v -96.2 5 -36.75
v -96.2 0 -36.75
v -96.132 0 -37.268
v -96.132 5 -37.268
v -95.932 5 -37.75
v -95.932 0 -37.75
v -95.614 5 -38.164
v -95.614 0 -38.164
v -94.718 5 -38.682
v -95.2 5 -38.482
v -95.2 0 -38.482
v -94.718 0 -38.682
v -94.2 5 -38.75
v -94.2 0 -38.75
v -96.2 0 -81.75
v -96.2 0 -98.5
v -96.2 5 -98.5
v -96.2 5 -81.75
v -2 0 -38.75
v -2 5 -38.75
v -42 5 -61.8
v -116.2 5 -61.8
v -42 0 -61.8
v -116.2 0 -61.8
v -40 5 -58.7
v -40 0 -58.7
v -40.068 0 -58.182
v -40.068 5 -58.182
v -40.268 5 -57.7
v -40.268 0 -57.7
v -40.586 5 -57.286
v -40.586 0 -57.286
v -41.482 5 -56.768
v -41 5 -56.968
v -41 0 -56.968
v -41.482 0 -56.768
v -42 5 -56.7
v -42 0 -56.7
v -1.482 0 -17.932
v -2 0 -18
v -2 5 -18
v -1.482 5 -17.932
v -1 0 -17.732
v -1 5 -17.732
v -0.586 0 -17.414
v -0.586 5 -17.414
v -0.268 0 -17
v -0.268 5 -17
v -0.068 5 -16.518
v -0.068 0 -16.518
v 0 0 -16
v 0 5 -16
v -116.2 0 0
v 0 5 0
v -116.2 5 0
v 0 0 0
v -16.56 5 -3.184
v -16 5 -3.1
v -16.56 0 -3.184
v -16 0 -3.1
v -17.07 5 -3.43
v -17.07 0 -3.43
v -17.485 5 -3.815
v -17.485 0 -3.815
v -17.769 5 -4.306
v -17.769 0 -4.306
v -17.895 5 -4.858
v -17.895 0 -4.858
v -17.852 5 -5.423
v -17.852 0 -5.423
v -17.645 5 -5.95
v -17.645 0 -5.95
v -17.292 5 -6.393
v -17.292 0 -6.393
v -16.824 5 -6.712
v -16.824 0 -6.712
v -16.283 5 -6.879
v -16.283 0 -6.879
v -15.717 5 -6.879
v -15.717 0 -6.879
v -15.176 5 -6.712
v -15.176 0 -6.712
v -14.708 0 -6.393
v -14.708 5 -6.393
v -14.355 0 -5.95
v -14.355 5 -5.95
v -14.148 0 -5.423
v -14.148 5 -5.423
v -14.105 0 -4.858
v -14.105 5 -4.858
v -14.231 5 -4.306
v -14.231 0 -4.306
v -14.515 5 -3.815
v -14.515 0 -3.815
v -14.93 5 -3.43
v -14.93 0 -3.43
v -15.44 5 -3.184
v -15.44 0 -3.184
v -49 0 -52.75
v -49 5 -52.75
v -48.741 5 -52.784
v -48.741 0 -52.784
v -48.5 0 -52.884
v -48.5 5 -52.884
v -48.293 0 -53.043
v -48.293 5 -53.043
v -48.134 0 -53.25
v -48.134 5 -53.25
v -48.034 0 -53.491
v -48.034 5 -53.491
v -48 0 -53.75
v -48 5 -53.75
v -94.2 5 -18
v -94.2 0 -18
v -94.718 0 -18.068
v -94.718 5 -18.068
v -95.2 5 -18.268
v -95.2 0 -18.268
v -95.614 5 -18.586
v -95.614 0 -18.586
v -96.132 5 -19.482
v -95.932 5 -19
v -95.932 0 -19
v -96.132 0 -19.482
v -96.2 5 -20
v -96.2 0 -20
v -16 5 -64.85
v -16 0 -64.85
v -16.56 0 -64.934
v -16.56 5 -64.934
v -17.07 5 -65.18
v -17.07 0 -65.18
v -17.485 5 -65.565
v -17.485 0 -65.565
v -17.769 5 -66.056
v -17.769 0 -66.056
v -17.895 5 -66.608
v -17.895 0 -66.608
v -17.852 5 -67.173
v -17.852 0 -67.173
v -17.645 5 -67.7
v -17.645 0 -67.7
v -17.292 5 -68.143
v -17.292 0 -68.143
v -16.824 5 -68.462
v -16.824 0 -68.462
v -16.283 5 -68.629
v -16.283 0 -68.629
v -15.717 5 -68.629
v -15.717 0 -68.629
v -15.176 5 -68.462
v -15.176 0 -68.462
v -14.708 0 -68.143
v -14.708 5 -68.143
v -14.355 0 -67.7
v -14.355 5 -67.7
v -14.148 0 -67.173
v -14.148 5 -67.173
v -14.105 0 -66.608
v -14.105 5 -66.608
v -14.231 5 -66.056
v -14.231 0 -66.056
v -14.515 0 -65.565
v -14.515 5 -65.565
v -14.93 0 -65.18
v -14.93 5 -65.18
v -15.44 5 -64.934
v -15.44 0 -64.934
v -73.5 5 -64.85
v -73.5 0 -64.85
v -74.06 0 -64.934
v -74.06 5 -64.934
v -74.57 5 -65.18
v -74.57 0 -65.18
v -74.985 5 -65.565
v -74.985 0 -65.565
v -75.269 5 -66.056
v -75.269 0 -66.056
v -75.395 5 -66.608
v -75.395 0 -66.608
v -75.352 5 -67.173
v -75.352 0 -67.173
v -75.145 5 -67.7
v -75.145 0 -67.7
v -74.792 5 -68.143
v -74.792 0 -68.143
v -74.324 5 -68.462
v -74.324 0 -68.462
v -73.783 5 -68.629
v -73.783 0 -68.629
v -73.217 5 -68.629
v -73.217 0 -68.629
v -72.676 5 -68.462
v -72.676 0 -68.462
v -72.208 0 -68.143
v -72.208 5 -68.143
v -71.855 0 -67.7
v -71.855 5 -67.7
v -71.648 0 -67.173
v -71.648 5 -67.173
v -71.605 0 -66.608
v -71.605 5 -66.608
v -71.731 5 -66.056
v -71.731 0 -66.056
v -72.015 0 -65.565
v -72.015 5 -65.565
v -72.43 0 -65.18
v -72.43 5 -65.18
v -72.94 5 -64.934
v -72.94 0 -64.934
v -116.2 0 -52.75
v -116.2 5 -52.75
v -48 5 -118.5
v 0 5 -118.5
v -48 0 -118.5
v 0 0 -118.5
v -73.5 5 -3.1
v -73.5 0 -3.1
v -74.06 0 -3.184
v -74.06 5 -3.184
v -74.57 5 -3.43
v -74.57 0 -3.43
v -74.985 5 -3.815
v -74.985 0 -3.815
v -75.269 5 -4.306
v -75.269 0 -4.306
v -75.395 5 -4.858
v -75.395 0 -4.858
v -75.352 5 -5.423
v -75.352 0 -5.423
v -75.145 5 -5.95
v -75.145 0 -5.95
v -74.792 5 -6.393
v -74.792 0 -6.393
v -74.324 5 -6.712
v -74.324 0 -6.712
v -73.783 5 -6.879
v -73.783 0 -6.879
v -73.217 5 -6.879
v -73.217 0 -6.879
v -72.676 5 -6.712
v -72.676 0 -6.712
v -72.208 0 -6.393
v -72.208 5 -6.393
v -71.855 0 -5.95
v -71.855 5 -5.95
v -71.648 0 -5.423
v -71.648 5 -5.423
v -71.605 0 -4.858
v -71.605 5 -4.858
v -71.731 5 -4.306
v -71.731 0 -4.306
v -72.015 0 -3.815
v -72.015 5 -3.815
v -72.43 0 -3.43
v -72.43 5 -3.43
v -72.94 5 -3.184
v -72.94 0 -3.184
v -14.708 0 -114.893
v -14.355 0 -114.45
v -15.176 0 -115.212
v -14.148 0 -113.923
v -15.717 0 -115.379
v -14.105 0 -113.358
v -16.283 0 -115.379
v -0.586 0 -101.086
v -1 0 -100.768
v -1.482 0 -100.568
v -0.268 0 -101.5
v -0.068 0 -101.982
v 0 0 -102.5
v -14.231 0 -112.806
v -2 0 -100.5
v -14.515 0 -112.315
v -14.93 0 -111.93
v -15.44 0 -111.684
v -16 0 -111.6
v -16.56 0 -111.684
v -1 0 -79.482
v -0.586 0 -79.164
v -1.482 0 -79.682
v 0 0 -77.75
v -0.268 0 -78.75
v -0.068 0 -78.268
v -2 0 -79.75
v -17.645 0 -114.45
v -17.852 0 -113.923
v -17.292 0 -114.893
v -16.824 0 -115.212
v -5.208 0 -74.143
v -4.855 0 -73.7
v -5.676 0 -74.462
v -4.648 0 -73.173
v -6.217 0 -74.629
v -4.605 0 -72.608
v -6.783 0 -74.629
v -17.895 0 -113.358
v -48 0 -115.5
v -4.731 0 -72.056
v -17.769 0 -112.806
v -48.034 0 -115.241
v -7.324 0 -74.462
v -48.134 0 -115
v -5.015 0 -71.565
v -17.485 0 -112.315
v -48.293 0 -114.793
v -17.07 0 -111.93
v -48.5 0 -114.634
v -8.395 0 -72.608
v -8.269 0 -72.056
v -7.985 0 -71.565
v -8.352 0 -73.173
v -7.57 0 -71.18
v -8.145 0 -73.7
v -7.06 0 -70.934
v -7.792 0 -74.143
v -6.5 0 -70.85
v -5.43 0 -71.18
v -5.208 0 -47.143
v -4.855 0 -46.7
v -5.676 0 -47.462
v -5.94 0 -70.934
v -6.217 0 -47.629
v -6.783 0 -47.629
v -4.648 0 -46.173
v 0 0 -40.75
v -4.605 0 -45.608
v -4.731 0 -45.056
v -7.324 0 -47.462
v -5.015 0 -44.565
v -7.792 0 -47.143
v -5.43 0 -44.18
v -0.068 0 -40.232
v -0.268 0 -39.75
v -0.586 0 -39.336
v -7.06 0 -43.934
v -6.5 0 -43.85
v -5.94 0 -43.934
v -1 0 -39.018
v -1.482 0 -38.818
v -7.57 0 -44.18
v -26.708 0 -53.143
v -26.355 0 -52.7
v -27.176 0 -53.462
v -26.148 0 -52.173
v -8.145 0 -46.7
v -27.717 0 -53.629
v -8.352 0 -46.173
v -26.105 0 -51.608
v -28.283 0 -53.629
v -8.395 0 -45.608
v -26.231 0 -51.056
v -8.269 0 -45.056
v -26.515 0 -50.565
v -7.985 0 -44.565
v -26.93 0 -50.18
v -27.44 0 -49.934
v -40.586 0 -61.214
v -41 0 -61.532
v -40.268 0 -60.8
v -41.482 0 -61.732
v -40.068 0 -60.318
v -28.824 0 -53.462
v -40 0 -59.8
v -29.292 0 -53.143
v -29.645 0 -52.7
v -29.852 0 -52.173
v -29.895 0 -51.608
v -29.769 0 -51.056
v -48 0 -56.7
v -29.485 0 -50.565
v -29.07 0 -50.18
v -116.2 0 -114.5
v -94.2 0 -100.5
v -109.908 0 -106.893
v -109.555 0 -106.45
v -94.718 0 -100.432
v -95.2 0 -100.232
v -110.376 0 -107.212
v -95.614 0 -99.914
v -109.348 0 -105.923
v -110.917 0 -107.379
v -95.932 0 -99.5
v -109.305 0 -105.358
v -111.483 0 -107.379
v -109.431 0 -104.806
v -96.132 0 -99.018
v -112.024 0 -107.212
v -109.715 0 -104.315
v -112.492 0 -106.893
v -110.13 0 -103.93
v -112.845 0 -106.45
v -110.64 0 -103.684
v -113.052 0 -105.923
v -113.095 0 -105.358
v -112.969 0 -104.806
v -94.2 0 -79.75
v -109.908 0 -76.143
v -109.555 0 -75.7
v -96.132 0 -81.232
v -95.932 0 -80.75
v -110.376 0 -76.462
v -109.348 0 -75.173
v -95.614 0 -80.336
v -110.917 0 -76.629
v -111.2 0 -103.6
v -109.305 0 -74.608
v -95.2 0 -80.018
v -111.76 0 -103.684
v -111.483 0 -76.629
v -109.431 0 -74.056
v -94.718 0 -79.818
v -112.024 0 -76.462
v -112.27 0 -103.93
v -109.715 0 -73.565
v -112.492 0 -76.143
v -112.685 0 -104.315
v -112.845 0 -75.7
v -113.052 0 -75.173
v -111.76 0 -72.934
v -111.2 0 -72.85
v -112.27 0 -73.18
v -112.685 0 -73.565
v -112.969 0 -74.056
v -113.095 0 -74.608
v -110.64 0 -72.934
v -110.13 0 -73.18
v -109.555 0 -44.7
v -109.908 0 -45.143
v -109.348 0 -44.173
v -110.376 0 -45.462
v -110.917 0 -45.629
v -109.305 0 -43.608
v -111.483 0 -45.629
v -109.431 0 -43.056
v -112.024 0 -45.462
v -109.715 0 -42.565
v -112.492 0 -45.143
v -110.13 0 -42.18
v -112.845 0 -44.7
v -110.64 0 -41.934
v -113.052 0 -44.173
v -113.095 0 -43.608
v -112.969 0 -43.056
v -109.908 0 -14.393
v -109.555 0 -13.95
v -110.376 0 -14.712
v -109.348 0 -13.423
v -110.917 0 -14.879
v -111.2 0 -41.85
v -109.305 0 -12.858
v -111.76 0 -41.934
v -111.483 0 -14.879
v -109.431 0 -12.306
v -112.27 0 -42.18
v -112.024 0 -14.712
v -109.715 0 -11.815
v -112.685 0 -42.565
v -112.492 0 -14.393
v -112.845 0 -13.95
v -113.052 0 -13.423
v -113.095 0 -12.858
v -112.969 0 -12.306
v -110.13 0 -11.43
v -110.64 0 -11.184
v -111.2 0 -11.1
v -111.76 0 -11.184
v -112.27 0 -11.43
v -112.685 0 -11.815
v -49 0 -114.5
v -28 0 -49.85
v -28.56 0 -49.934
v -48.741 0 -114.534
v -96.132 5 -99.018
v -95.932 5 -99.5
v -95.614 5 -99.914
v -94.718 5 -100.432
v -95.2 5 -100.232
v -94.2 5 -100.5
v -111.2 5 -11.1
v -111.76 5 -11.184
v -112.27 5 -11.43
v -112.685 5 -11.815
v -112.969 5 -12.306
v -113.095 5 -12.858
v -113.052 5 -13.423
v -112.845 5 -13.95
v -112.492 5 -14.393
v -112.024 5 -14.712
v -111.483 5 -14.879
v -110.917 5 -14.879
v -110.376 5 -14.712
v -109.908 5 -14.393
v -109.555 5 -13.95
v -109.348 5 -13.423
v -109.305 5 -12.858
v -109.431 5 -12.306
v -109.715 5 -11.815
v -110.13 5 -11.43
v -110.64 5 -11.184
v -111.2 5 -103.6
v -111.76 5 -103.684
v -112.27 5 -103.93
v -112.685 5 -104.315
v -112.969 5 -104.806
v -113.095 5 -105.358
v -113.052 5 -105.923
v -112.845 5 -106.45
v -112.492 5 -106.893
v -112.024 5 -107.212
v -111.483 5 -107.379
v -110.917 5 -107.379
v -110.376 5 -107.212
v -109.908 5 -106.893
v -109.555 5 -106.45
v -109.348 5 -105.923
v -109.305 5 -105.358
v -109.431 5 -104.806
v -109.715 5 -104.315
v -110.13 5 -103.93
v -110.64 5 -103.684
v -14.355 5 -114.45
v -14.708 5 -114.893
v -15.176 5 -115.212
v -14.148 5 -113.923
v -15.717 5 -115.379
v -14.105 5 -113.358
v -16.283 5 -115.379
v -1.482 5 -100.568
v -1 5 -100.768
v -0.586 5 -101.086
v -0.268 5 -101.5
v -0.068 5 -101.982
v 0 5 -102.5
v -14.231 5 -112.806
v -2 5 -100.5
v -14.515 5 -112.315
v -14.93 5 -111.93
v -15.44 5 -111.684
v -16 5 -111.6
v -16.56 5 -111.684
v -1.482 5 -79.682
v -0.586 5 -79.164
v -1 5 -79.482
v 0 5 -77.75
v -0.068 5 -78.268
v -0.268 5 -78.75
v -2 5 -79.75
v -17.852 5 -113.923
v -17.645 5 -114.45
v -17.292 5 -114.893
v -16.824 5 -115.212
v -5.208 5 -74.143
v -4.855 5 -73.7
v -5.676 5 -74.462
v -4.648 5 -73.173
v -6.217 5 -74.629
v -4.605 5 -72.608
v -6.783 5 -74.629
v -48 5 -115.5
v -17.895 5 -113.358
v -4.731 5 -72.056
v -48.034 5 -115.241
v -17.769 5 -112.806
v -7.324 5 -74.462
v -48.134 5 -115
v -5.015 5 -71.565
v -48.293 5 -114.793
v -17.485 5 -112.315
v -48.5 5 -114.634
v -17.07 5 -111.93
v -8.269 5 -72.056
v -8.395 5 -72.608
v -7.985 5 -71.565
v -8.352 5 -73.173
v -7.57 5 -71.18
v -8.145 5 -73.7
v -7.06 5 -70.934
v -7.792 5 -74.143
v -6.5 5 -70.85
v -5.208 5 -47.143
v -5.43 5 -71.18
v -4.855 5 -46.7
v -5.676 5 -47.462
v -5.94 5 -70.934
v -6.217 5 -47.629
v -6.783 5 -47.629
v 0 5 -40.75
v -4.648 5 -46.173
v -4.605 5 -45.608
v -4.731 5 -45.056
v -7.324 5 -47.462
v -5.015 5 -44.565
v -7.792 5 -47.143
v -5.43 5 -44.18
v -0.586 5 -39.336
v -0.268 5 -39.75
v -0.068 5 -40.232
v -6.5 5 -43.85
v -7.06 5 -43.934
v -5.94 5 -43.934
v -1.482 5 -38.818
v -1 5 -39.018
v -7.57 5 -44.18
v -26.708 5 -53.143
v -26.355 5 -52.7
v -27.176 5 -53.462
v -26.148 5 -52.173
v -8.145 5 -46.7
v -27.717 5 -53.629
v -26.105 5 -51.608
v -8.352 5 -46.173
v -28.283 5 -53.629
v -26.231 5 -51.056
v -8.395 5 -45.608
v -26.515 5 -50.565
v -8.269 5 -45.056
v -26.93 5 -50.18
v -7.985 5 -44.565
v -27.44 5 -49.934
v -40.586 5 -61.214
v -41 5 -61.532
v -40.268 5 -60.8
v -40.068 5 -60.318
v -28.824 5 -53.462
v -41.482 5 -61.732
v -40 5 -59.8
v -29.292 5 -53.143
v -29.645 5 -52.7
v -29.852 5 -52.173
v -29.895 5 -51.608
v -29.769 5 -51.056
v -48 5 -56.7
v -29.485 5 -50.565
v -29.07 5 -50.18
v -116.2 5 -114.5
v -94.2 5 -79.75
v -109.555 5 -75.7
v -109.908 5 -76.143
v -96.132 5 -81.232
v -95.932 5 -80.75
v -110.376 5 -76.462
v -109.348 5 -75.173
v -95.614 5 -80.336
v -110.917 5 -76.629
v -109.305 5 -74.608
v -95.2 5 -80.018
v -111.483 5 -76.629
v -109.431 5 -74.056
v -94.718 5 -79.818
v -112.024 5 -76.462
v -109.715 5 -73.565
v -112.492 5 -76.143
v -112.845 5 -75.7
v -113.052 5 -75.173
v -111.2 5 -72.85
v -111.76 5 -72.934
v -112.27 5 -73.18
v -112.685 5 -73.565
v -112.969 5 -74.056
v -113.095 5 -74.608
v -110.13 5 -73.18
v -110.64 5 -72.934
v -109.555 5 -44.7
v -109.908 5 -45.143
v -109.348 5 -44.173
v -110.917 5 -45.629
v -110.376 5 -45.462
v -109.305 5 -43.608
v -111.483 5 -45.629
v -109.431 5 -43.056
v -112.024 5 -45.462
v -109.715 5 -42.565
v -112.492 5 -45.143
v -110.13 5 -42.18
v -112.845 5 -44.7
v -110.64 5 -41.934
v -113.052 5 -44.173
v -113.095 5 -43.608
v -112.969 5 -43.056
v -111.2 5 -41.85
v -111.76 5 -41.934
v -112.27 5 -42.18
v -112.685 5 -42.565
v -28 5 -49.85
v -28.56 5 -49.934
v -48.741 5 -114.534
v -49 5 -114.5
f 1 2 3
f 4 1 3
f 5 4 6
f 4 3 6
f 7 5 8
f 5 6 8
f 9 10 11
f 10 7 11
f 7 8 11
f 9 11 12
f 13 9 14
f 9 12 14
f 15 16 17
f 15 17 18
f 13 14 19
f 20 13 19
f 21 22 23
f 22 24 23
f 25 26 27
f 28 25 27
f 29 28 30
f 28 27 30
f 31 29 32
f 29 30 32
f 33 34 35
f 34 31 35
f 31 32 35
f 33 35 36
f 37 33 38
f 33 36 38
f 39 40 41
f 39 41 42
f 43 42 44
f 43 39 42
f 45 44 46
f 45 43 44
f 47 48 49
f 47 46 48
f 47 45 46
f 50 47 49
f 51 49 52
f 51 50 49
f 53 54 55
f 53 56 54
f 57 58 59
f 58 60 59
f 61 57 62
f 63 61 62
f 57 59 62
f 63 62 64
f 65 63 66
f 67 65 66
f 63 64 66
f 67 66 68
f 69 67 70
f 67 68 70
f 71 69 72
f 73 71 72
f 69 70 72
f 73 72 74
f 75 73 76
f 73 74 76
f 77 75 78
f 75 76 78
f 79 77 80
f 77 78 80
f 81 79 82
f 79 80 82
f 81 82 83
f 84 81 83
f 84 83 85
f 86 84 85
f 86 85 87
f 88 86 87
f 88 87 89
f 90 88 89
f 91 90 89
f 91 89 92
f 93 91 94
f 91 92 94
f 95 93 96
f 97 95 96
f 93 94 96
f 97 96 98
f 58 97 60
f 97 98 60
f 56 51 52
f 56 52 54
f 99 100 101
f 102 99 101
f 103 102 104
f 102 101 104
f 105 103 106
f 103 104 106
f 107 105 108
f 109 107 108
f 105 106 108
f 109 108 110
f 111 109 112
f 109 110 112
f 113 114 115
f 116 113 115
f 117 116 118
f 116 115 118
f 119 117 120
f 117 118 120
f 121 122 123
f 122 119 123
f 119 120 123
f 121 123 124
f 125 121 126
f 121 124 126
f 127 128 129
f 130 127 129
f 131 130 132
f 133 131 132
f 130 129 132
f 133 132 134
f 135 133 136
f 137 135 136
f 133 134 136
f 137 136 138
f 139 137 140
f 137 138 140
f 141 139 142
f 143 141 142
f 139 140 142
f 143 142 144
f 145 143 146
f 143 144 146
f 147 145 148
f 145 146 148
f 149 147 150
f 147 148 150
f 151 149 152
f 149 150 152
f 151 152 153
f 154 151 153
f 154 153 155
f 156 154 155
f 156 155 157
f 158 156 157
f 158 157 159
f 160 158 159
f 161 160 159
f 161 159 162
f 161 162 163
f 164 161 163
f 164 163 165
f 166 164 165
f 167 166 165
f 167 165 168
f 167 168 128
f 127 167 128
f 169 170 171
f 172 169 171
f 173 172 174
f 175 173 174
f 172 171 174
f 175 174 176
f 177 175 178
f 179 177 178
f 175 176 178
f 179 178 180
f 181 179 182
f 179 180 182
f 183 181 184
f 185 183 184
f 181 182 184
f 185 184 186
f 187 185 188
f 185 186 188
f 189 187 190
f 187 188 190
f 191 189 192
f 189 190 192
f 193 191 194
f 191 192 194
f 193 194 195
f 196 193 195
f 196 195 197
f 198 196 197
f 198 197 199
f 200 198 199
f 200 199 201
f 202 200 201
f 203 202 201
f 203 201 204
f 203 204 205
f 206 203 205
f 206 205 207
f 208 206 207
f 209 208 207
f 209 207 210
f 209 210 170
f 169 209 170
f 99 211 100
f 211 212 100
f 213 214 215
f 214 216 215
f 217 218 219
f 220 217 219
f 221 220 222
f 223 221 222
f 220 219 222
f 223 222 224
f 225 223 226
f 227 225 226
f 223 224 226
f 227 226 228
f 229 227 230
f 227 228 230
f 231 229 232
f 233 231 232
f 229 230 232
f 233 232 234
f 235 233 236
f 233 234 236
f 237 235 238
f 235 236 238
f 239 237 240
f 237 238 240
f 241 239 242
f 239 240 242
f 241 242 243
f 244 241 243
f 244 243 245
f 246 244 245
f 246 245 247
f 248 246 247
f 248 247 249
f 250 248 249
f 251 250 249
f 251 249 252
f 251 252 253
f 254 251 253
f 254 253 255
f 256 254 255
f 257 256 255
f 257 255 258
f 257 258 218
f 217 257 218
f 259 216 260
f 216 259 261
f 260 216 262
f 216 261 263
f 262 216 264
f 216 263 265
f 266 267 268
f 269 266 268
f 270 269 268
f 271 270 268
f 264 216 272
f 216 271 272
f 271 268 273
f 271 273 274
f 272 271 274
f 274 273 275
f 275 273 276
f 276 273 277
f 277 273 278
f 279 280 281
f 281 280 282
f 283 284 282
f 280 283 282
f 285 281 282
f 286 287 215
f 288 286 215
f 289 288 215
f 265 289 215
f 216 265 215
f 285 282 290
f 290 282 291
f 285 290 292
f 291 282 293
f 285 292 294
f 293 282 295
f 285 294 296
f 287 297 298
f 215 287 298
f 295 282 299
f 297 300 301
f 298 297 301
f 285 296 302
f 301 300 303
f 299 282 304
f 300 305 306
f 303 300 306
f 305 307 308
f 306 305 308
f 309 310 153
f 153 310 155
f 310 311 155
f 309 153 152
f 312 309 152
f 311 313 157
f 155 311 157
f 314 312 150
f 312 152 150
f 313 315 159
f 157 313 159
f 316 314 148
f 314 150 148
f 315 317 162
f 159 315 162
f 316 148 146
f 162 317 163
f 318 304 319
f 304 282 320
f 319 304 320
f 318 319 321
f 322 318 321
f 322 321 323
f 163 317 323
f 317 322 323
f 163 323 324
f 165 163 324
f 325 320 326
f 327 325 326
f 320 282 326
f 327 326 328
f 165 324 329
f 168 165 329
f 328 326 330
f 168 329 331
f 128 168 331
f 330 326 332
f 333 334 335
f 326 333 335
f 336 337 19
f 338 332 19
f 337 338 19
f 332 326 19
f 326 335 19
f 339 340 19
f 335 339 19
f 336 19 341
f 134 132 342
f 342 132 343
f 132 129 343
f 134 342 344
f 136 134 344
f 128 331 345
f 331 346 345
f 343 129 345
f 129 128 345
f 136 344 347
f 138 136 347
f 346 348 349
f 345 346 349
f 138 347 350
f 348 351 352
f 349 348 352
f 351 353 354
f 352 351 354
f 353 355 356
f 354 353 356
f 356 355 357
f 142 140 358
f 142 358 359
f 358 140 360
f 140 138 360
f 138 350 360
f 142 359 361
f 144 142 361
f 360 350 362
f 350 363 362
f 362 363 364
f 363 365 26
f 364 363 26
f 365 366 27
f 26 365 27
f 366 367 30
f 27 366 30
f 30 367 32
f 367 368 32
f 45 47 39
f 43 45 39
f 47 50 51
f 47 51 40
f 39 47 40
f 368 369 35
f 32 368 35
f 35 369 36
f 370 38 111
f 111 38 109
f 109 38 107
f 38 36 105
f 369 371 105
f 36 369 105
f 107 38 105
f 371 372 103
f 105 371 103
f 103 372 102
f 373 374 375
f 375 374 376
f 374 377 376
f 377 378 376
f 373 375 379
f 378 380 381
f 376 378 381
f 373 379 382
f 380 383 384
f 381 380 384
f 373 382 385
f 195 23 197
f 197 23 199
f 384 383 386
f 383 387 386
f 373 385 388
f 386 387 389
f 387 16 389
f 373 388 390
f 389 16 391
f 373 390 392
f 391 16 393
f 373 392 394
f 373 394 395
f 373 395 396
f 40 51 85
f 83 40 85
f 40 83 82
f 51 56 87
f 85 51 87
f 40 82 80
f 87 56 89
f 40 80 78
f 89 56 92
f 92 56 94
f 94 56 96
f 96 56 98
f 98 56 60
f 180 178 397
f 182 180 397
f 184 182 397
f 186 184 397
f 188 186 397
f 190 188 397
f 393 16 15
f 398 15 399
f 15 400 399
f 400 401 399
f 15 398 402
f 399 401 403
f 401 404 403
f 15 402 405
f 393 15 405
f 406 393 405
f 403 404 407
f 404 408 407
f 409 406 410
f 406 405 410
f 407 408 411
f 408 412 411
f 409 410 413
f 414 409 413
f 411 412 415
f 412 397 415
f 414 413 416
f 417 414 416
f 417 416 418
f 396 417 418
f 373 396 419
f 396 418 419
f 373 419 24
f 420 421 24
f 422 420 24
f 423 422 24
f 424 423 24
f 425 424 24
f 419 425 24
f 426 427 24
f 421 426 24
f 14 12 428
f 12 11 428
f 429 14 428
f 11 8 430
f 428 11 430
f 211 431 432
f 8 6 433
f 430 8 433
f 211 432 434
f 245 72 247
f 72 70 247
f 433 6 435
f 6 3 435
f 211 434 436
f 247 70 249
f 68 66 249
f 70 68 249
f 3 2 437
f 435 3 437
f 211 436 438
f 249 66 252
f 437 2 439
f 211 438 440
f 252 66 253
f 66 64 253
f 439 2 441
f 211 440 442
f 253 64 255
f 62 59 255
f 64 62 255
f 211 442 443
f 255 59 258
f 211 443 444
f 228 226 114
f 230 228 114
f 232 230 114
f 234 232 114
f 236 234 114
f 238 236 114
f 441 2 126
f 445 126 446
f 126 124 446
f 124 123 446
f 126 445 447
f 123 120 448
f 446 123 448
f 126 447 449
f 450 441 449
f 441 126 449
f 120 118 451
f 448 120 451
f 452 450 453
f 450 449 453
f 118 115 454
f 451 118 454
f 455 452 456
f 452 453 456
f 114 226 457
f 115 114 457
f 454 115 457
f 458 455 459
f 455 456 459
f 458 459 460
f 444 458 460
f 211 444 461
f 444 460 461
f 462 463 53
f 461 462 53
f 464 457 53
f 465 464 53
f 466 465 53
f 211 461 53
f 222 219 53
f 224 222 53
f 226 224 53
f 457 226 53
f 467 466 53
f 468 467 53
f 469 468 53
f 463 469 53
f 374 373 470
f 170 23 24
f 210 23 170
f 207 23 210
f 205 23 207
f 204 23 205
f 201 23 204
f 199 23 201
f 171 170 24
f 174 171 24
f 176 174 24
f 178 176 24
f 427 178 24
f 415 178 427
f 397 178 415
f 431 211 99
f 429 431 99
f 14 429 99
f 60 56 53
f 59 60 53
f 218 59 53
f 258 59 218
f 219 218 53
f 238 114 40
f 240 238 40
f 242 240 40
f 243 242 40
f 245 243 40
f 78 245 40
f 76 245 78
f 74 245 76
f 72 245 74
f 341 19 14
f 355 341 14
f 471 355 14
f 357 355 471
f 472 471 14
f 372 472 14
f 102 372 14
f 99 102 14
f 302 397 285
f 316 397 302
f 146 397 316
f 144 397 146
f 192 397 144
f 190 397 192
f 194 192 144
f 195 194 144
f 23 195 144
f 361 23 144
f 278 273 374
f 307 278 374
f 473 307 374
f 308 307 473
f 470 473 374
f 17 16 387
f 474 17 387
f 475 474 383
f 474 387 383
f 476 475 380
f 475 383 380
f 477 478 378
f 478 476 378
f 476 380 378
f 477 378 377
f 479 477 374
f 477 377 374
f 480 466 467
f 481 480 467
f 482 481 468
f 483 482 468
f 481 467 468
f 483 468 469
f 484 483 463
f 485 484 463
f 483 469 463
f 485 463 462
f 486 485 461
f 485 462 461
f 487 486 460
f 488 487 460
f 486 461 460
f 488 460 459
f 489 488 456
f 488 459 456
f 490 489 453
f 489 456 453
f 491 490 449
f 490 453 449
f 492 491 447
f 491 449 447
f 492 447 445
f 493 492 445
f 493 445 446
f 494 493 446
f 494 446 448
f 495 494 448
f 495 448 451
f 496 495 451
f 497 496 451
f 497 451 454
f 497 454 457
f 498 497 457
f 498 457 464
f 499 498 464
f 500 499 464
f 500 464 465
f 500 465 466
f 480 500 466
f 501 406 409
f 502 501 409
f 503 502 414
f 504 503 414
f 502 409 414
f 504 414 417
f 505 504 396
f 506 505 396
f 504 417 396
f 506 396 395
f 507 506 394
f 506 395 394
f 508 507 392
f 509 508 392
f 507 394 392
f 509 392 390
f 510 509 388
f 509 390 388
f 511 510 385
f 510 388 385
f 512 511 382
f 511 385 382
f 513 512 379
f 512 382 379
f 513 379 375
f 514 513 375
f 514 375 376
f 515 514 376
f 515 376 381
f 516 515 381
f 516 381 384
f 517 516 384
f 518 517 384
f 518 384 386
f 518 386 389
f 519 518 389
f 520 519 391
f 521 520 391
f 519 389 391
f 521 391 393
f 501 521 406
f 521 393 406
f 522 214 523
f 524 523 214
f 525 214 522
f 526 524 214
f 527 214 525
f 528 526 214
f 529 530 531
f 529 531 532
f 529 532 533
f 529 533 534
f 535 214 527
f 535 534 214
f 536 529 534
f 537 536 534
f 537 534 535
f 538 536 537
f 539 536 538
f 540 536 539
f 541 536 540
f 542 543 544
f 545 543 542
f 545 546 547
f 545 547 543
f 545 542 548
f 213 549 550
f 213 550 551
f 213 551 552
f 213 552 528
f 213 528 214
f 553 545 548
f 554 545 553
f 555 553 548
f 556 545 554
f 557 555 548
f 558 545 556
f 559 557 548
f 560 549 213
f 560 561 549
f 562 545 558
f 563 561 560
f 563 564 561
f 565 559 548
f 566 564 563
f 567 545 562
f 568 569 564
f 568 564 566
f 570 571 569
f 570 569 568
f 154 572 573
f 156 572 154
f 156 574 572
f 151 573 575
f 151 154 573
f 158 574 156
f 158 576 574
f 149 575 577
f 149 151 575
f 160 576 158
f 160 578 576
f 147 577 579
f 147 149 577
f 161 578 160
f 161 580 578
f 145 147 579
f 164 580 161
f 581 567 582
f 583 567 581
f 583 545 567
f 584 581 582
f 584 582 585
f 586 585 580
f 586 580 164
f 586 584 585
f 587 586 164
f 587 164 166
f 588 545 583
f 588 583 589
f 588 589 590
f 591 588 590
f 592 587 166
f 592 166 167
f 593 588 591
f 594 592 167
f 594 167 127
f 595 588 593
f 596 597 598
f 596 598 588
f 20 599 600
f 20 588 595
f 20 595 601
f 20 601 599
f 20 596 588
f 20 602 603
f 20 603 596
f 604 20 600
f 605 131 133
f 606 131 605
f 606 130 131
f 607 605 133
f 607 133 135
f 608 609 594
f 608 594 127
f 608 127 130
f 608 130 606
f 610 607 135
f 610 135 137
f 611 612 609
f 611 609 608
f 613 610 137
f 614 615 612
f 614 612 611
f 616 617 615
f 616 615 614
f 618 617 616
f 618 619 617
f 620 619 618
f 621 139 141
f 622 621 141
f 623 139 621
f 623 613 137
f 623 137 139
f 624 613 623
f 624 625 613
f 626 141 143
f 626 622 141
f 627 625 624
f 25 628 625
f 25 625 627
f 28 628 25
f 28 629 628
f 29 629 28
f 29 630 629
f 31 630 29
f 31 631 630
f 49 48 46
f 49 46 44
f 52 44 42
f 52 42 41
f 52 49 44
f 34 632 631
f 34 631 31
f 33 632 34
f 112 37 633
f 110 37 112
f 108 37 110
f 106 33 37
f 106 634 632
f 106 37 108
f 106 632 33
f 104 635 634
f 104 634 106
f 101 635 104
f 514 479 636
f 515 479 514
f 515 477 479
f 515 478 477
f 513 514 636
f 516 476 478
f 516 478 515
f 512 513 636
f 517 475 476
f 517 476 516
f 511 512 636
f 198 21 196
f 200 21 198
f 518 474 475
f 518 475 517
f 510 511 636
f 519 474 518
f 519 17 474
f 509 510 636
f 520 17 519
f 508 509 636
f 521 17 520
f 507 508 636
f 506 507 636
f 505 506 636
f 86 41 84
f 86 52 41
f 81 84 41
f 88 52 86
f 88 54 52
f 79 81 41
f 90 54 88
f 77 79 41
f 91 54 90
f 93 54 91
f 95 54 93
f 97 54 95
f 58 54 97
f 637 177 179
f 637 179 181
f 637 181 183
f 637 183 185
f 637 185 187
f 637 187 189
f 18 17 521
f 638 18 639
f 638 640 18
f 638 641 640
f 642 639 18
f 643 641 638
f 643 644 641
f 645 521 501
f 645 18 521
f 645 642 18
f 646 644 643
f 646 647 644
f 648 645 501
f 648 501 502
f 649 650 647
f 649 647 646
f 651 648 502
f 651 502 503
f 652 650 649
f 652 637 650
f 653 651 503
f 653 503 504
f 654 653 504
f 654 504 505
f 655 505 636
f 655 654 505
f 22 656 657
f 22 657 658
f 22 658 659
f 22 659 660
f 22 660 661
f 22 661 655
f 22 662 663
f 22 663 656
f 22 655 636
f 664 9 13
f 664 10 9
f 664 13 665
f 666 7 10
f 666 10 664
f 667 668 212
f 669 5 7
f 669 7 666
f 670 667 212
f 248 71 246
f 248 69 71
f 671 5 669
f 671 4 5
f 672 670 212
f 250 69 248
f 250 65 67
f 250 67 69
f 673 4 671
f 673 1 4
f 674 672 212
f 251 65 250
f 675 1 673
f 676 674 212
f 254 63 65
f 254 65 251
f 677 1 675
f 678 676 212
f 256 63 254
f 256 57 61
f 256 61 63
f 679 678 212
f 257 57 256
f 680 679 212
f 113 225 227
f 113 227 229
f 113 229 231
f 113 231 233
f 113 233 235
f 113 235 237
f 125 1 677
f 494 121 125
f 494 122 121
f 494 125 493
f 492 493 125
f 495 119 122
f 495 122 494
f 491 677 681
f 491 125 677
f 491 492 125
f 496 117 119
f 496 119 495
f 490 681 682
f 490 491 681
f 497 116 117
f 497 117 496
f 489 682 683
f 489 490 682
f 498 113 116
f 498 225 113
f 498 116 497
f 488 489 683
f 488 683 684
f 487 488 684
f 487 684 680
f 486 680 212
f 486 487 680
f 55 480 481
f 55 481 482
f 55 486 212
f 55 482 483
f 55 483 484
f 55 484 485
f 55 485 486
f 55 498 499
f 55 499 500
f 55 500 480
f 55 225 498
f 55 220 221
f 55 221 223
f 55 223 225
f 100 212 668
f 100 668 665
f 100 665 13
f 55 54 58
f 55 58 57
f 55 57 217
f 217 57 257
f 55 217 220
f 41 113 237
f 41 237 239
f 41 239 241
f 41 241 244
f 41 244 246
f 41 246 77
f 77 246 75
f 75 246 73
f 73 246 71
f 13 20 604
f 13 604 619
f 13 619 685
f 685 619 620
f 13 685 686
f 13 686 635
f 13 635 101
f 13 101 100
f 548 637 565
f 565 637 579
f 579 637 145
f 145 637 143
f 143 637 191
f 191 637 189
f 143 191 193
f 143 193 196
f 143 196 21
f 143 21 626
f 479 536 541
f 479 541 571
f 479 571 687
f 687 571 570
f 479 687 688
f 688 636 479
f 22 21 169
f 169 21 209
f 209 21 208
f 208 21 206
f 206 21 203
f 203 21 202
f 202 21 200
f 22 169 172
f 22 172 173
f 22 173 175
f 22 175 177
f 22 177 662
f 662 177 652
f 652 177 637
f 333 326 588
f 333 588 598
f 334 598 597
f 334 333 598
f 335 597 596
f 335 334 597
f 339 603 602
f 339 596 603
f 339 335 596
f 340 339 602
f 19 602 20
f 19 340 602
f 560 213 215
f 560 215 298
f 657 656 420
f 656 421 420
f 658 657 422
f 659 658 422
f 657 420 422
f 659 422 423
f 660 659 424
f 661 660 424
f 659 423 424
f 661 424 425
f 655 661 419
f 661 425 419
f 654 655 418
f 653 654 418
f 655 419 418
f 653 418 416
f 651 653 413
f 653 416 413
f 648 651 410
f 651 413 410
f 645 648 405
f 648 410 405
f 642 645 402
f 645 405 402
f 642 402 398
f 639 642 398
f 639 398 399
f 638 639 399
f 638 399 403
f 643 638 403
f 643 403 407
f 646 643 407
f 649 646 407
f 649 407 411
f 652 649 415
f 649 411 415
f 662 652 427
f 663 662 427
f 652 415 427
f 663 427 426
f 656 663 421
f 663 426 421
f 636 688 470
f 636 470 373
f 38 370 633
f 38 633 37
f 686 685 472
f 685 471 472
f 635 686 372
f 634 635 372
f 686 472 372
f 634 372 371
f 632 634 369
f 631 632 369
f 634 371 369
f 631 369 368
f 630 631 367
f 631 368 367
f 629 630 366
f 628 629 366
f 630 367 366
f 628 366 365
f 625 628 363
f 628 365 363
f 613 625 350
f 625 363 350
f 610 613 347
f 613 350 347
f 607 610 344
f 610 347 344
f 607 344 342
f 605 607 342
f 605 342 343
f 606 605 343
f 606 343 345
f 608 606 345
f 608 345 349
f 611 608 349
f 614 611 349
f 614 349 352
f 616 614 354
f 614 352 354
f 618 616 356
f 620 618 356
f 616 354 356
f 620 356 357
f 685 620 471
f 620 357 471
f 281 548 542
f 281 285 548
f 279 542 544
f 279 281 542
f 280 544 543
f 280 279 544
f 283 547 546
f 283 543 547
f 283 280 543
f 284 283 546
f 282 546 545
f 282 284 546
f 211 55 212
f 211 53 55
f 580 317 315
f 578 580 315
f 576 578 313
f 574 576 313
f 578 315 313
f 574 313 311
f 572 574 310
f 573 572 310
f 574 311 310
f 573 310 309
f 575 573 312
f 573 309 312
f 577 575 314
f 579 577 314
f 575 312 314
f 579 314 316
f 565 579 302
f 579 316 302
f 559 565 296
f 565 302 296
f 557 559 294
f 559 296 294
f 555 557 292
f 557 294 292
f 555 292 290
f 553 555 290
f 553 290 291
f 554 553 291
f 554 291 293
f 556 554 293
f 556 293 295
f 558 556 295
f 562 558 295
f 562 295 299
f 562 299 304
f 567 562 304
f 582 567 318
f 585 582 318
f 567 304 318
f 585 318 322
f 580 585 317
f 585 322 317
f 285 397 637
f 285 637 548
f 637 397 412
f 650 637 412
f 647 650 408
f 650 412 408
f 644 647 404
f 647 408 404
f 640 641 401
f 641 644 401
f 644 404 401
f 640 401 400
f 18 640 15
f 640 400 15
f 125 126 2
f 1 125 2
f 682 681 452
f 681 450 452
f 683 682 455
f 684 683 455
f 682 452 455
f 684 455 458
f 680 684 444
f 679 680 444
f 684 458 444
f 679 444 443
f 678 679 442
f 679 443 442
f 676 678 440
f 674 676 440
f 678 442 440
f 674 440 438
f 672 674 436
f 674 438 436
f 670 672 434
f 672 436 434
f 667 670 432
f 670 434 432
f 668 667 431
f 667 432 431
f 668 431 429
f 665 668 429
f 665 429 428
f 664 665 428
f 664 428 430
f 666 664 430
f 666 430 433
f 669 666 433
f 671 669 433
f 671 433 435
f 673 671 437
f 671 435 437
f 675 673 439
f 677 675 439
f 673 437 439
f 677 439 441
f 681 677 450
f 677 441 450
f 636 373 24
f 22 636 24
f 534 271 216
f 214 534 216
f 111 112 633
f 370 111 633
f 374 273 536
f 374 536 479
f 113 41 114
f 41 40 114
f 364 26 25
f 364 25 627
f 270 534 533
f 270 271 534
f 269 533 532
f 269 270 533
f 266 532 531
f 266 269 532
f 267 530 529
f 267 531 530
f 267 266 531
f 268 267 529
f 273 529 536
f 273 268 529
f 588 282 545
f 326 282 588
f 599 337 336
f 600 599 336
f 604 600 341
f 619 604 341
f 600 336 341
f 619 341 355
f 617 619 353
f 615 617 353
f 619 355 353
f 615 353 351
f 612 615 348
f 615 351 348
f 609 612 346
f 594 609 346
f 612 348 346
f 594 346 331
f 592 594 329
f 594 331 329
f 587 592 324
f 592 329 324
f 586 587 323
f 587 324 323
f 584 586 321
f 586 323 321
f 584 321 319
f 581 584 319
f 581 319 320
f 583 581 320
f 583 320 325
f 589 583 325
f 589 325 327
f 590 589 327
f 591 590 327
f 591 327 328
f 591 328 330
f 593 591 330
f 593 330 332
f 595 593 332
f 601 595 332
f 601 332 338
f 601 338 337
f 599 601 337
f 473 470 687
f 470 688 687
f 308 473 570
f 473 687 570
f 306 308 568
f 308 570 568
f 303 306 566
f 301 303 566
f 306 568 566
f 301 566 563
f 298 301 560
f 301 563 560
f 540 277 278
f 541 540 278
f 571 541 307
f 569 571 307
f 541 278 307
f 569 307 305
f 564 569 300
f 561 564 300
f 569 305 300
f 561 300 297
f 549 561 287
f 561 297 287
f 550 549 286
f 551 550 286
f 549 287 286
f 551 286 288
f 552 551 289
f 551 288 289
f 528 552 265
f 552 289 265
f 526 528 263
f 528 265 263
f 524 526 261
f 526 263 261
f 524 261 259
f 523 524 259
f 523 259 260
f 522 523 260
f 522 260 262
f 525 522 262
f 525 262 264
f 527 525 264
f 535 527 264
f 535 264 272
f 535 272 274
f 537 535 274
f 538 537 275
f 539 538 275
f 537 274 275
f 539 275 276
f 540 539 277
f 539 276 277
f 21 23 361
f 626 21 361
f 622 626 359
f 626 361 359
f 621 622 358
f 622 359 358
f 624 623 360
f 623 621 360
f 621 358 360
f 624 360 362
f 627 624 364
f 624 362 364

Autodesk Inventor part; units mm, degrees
ref_plane "YZ Plane" through (0, 0, 0) normal (1, 0, 0) x (0, 1, 0)
ref_plane "XZ Plane" through (0, 0, 0) normal (0, 1, 0) x (-1, 0, 0)
ref_plane "XY Plane" through (0, 0, 0) normal (0, 0, 1) x (1, 0, 0)
sketch "Sketch1" plane through (0, 0, 0) normal (0, 1, 0) x (-1, 0, 0)
  line L0 (0, 0) -> (116.2, 0)
  line L1 (116.2, 0) -> (116.2, -56.7)
  line L2 (116.2, -56.7) -> (42, -56.7)
  line L3 (2, -18) -> (94.2, -18)
  line L4 (96.2, -20) -> (96.2, -36.75)
  line L5 (94.2, -38.75) -> (2, -38.75)
  arc A0 (96.2, -20) -> (94.2, -18) centre (94.2, -20) ccw
  arc A1 (94.2, -38.75) -> (96.2, -36.75) centre (94.2, -36.75) ccw
  line L6 (0, -56.75) -> (0, -40.75)
  line L7 (0, -16) -> (0, 0)
  arc A2 (0, -16) -> (2, -18) centre (2, -16) ccw
  arc A3 (2, -38.75) -> (0, -40.75) centre (2, -40.75) ccw
  line L8 (151.2965, -59.25) -> (-22.324, -59.25) construction
  line L9 (0, -118.5) -> (116.2, -118.5)
  line L10 (116.2, -118.5) -> (116.2, -61.8)
  line L11 (116.2, -61.8) -> (42, -61.8)
  line L12 (2, -100.5) -> (94.2, -100.5)
  line L13 (96.2, -98.5) -> (96.2, -81.75)
  line L14 (94.2, -79.75) -> (2, -79.75)
  arc A4 (94.2, -100.5) -> (96.2, -98.5) centre (94.2, -98.5) ccw
  arc A5 (96.2, -81.75) -> (94.2, -79.75) centre (94.2, -81.75) ccw
  line L15 (0, -61.75) -> (0, -77.75)
  line L16 (0, -102.5) -> (0, -118.5)
  arc A6 (2, -100.5) -> (0, -102.5) centre (2, -102.5) ccw
  arc A7 (0, -77.75) -> (2, -79.75) centre (2, -77.75) ccw
  line L17 (40, -58.7) -> (40, -59.8)
  line L18 (0, -61.75) -> (0, -56.75)
  arc A8 (40, -59.8) -> (42, -61.8) centre (42, -59.8) ccw
  arc A9 (42, -56.7) -> (40, -58.7) centre (42, -58.7) ccw
  point P0 (96.2, -38.75)
  point P1 (96.2, -18)
  point P2 (0, -38.75)
  point P3 (0, -28.375)
  point P4 (96.2, -79.75)
  point P5 (96.2, -100.5)
  point P6 (0, -79.75)
  point P7 (0, -90.125)
  dimension "d3" = 20.75
  dimension "d4" = 2
  dimension "d11" = 2
  dimension "d26" = 2
  dimension "d27" = 59.25
  dimension "d28" = 59.25
  dimension "d29" = 116.2
  dimension "d30" = 20
  dimension "d31" = 5.1
  dimension "d32" = 2.55
  dimension "d33" = 40
  dimension "d34" = 18
extrude "Extrusion1" add sketch "Sketch1" along normal blind 5
sketch "Sketch3" plane through (0, 5, 0) normal (0, 1, 0) x (1, 0, 0)
  line L0 (-141.9344, 59.25) -> (33.9299, 59.25) construction
  line L1 (0, 40.75) -> (0, 77.75) construction
  line L2 (-141.9344, 66.75) -> (21.3081, 66.75) construction
  line L3 (-111.2, -34.402) -> (-111.2, 125.7551) construction
  line L4 (-130.4345, 113.5) -> (5.6009, 113.5) construction
  line L5 (-141.9344, 5) -> (8.4057, 5) construction
  line L6 (-116.2, 0) -> (0, 0) construction
  line L7 (0, 118.5) -> (-116.2, 118.5) construction
  line L8 (-150.0685, 51.75) -> (12.052, 51.75) construction
  line L9 (-16, -62.5764) -> (-16, 180.6044) construction
  line L10 (0, 102.5) -> (0, 118.5) construction
  line L11 (-73.5, -39.5766) -> (-73.5, 137.6901) construction
  line L12 (-73.5, -38.2066) -> (-73.5, 155.6811) construction
  line L13 (-116.2, 56.7) -> (-116.2, 0) projected
  point P0 (0, 59.25)
  point P1 (-111.2, 13)
  point P2 (-111.2, 43.75)
  point P3 (-111.2, 74.75)
  point P4 (-111.2, 105.5)
  point P5 (-16, 5)
  point P6 (-16, 113.5)
  point P7 (-16, 66.75)
  point P8 (-73.5, 66.75)
  point P9 (-28, 51.75)
  point P10 (-73.5, 5)
  dimension "d35" = 5
  dimension "d36" = 5
  dimension "d37" = 7.5
  dimension "d38" = 13
  dimension "d39" = 15.5
  dimension "d40" = 15.5
  dimension "d41" = 13
  dimension "d42" = 7.5
  dimension "d43" = 16
  dimension "d44" = 12
  dimension "d45" = 73.5
  dimension "d53" = 73.5
  dimension "d54" = 5
hole "Hole1" at (-111.2, 5, -13) at (-111.2, 5, -43.75) at (-111.2, 5, -74.75) at (-111.2, 5, -105.5) at (-16, 5, -5) at (-16, 5, -113.5) at (-16, 5, -66.75) at (-73.5, 5, -66.75) at (-28, 5, -51.75) at (-73.5, 5, -5) direction (0, -1, 0) diameter 3.8 end through all
sketch "Sketch4" plane through (0, 5, 0) normal (0, 1, 0) x (1, 0, 0)
  line L0 (-116.2, 52.75) -> (-49, 52.75)
  line L1 (-48, 53.75) -> (-48, 64.75)
  line L2 (-49, 65.75) -> (-116.2, 65.75)
  line L3 (-116.2, 65.75) -> (-116.2, 52.75)
  line L4 (-144.8708, 59.25) -> (29.3106, 59.25) construction
  line L5 (-40, 59.8) -> (-40, 58.7) construction
  line L6 (0, 40.75) -> (0, 77.75) projected
  line L7 (0, 102.5) -> (0, 118.5) projected
  arc A0 (-48, 64.75) -> (-49, 65.75) centre (-49, 64.75) ccw
  arc A1 (-49, 52.75) -> (-48, 53.75) centre (-49, 53.75) ccw
  line L8 (-116.2, 59.25) -> (-48, 59.25)
  line L9 (0, 118.5) -> (-116.2, 118.5) projected
  line L10 (-116.2, 118.5) -> (-48, 118.5)
  line L11 (-48, 118.5) -> (-48, 115.5)
  line L12 (-49, 114.5) -> (-116.2, 114.5)
  line L13 (-116.2, 114.5) -> (-116.2, 118.5)
  arc A2 (-49, 114.5) -> (-48, 115.5) centre (-49, 115.5) ccw
  circle A3 centre (-28, 51.75) radius 1.9 projected
  circle A4 centre (-16, 66.75) radius 1.9 projected
  circle A5 centre (-16, 5) radius 1.9 projected
  circle A6 centre (-111.2, 74.75) radius 1.9 projected
  circle A7 centre (-111.2, 13) radius 1.9 projected
  circle A8 centre (-111.2, 43.75) radius 1.9 projected
  circle A9 centre (-111.2, 105.5) radius 1.9 projected
  circle A10 centre (-16, 113.5) radius 1.9 projected
  circle A11 centre (-73.5, 66.75) radius 1.9 projected
  circle A12 centre (-73.5, 5) radius 1.9 projected
  line L14 (-2, 18) -> (-94.2, 18) projected
  arc A13 (-96.2, 20) -> (-94.2, 18) centre (-94.2, 20) ccw projected
  line L15 (-96.2, 20) -> (-96.2, 36.75) projected
  arc A14 (-94.2, 38.75) -> (-96.2, 36.75) centre (-94.2, 36.75) ccw projected
  line L16 (-94.2, 38.75) -> (-2, 38.75) projected
  arc A15 (-2, 38.75) -> (0, 40.75) centre (-2, 40.75) ccw projected
  line L17 (0, 40.75) -> (0, 77.75) projected
  arc A16 (0, 77.75) -> (-2, 79.75) centre (-2, 77.75) ccw projected
  line L18 (-2, 79.75) -> (-94.2, 79.75) projected
  arc A17 (-96.2, 81.75) -> (-94.2, 79.75) centre (-94.2, 81.75) ccw projected
  line L19 (-96.2, 81.75) -> (-96.2, 98.5) projected
  arc A18 (-94.2, 100.5) -> (-96.2, 98.5) centre (-94.2, 98.5) ccw projected
  line L20 (-94.2, 100.5) -> (-2, 100.5) projected
  arc A19 (-2, 100.5) -> (0, 102.5) centre (-2, 102.5) ccw projected
  line L21 (0, 102.5) -> (0, 118.5) projected
  line L22 (0, 118.5) -> (-116.2, 118.5) projected
  line L23 (-116.2, 118.5) -> (-116.2, 61.8) projected
  line L24 (-116.2, 61.8) -> (-42, 61.8) projected
  arc A20 (-40, 59.8) -> (-42, 61.8) centre (-42, 59.8) ccw projected
  line L25 (-40, 59.8) -> (-40, 58.7) projected
  arc A21 (-42, 56.7) -> (-40, 58.7) centre (-42, 58.7) ccw projected
  line L26 (-42, 56.7) -> (-116.2, 56.7) projected
  line L27 (-116.2, 56.7) -> (-116.2, 0) projected
  line L28 (-116.2, 0) -> (0, 0) projected
  line L29 (0, 0) -> (0, 16) projected
  arc A22 (0, 16) -> (-2, 18) centre (-2, 16) ccw projected
  point P0 (-40, 59.25)
  dimension "d55" = 48
  dimension "d57" = 6.5
  dimension "d58" = 13
  dimension "d64" = 4
extrude "Extrusion2" cut sketch "Sketch4" against normal blind 5 contours L3 L26 L1 A1 L0 | L3 L8 L1 L26 | L13 L9 L11 A2 L12
sketch "Sketch5" plane through (0, 5, 0) normal (0, 1, 0) x (1, 0, 0)
  line L0 (-6.5, 90.3299) -> (-6.5, 26.5621) construction
  line L1 (0, 40.75) -> (0, 77.75) projected
  line L2 (-18, 59.25) -> (18, 59.25) construction
  point P0 (0, 0)
  point P1 (0, 59.25)
  point P2 (0, 59.25)
  point P3 (-6.5, 72.75)
  point P4 (-6.5, 45.75)
  dimension "d66" = 6.5
  dimension "d67" = 13.5
  dimension "d68" = 13.5
hole "Hole2" at (-6.5, 5, -72.75) at (-6.5, 5, -45.75) direction (0, -1, 0) diameter 3.8 end through all
properties part number "Battery Top Plate"
